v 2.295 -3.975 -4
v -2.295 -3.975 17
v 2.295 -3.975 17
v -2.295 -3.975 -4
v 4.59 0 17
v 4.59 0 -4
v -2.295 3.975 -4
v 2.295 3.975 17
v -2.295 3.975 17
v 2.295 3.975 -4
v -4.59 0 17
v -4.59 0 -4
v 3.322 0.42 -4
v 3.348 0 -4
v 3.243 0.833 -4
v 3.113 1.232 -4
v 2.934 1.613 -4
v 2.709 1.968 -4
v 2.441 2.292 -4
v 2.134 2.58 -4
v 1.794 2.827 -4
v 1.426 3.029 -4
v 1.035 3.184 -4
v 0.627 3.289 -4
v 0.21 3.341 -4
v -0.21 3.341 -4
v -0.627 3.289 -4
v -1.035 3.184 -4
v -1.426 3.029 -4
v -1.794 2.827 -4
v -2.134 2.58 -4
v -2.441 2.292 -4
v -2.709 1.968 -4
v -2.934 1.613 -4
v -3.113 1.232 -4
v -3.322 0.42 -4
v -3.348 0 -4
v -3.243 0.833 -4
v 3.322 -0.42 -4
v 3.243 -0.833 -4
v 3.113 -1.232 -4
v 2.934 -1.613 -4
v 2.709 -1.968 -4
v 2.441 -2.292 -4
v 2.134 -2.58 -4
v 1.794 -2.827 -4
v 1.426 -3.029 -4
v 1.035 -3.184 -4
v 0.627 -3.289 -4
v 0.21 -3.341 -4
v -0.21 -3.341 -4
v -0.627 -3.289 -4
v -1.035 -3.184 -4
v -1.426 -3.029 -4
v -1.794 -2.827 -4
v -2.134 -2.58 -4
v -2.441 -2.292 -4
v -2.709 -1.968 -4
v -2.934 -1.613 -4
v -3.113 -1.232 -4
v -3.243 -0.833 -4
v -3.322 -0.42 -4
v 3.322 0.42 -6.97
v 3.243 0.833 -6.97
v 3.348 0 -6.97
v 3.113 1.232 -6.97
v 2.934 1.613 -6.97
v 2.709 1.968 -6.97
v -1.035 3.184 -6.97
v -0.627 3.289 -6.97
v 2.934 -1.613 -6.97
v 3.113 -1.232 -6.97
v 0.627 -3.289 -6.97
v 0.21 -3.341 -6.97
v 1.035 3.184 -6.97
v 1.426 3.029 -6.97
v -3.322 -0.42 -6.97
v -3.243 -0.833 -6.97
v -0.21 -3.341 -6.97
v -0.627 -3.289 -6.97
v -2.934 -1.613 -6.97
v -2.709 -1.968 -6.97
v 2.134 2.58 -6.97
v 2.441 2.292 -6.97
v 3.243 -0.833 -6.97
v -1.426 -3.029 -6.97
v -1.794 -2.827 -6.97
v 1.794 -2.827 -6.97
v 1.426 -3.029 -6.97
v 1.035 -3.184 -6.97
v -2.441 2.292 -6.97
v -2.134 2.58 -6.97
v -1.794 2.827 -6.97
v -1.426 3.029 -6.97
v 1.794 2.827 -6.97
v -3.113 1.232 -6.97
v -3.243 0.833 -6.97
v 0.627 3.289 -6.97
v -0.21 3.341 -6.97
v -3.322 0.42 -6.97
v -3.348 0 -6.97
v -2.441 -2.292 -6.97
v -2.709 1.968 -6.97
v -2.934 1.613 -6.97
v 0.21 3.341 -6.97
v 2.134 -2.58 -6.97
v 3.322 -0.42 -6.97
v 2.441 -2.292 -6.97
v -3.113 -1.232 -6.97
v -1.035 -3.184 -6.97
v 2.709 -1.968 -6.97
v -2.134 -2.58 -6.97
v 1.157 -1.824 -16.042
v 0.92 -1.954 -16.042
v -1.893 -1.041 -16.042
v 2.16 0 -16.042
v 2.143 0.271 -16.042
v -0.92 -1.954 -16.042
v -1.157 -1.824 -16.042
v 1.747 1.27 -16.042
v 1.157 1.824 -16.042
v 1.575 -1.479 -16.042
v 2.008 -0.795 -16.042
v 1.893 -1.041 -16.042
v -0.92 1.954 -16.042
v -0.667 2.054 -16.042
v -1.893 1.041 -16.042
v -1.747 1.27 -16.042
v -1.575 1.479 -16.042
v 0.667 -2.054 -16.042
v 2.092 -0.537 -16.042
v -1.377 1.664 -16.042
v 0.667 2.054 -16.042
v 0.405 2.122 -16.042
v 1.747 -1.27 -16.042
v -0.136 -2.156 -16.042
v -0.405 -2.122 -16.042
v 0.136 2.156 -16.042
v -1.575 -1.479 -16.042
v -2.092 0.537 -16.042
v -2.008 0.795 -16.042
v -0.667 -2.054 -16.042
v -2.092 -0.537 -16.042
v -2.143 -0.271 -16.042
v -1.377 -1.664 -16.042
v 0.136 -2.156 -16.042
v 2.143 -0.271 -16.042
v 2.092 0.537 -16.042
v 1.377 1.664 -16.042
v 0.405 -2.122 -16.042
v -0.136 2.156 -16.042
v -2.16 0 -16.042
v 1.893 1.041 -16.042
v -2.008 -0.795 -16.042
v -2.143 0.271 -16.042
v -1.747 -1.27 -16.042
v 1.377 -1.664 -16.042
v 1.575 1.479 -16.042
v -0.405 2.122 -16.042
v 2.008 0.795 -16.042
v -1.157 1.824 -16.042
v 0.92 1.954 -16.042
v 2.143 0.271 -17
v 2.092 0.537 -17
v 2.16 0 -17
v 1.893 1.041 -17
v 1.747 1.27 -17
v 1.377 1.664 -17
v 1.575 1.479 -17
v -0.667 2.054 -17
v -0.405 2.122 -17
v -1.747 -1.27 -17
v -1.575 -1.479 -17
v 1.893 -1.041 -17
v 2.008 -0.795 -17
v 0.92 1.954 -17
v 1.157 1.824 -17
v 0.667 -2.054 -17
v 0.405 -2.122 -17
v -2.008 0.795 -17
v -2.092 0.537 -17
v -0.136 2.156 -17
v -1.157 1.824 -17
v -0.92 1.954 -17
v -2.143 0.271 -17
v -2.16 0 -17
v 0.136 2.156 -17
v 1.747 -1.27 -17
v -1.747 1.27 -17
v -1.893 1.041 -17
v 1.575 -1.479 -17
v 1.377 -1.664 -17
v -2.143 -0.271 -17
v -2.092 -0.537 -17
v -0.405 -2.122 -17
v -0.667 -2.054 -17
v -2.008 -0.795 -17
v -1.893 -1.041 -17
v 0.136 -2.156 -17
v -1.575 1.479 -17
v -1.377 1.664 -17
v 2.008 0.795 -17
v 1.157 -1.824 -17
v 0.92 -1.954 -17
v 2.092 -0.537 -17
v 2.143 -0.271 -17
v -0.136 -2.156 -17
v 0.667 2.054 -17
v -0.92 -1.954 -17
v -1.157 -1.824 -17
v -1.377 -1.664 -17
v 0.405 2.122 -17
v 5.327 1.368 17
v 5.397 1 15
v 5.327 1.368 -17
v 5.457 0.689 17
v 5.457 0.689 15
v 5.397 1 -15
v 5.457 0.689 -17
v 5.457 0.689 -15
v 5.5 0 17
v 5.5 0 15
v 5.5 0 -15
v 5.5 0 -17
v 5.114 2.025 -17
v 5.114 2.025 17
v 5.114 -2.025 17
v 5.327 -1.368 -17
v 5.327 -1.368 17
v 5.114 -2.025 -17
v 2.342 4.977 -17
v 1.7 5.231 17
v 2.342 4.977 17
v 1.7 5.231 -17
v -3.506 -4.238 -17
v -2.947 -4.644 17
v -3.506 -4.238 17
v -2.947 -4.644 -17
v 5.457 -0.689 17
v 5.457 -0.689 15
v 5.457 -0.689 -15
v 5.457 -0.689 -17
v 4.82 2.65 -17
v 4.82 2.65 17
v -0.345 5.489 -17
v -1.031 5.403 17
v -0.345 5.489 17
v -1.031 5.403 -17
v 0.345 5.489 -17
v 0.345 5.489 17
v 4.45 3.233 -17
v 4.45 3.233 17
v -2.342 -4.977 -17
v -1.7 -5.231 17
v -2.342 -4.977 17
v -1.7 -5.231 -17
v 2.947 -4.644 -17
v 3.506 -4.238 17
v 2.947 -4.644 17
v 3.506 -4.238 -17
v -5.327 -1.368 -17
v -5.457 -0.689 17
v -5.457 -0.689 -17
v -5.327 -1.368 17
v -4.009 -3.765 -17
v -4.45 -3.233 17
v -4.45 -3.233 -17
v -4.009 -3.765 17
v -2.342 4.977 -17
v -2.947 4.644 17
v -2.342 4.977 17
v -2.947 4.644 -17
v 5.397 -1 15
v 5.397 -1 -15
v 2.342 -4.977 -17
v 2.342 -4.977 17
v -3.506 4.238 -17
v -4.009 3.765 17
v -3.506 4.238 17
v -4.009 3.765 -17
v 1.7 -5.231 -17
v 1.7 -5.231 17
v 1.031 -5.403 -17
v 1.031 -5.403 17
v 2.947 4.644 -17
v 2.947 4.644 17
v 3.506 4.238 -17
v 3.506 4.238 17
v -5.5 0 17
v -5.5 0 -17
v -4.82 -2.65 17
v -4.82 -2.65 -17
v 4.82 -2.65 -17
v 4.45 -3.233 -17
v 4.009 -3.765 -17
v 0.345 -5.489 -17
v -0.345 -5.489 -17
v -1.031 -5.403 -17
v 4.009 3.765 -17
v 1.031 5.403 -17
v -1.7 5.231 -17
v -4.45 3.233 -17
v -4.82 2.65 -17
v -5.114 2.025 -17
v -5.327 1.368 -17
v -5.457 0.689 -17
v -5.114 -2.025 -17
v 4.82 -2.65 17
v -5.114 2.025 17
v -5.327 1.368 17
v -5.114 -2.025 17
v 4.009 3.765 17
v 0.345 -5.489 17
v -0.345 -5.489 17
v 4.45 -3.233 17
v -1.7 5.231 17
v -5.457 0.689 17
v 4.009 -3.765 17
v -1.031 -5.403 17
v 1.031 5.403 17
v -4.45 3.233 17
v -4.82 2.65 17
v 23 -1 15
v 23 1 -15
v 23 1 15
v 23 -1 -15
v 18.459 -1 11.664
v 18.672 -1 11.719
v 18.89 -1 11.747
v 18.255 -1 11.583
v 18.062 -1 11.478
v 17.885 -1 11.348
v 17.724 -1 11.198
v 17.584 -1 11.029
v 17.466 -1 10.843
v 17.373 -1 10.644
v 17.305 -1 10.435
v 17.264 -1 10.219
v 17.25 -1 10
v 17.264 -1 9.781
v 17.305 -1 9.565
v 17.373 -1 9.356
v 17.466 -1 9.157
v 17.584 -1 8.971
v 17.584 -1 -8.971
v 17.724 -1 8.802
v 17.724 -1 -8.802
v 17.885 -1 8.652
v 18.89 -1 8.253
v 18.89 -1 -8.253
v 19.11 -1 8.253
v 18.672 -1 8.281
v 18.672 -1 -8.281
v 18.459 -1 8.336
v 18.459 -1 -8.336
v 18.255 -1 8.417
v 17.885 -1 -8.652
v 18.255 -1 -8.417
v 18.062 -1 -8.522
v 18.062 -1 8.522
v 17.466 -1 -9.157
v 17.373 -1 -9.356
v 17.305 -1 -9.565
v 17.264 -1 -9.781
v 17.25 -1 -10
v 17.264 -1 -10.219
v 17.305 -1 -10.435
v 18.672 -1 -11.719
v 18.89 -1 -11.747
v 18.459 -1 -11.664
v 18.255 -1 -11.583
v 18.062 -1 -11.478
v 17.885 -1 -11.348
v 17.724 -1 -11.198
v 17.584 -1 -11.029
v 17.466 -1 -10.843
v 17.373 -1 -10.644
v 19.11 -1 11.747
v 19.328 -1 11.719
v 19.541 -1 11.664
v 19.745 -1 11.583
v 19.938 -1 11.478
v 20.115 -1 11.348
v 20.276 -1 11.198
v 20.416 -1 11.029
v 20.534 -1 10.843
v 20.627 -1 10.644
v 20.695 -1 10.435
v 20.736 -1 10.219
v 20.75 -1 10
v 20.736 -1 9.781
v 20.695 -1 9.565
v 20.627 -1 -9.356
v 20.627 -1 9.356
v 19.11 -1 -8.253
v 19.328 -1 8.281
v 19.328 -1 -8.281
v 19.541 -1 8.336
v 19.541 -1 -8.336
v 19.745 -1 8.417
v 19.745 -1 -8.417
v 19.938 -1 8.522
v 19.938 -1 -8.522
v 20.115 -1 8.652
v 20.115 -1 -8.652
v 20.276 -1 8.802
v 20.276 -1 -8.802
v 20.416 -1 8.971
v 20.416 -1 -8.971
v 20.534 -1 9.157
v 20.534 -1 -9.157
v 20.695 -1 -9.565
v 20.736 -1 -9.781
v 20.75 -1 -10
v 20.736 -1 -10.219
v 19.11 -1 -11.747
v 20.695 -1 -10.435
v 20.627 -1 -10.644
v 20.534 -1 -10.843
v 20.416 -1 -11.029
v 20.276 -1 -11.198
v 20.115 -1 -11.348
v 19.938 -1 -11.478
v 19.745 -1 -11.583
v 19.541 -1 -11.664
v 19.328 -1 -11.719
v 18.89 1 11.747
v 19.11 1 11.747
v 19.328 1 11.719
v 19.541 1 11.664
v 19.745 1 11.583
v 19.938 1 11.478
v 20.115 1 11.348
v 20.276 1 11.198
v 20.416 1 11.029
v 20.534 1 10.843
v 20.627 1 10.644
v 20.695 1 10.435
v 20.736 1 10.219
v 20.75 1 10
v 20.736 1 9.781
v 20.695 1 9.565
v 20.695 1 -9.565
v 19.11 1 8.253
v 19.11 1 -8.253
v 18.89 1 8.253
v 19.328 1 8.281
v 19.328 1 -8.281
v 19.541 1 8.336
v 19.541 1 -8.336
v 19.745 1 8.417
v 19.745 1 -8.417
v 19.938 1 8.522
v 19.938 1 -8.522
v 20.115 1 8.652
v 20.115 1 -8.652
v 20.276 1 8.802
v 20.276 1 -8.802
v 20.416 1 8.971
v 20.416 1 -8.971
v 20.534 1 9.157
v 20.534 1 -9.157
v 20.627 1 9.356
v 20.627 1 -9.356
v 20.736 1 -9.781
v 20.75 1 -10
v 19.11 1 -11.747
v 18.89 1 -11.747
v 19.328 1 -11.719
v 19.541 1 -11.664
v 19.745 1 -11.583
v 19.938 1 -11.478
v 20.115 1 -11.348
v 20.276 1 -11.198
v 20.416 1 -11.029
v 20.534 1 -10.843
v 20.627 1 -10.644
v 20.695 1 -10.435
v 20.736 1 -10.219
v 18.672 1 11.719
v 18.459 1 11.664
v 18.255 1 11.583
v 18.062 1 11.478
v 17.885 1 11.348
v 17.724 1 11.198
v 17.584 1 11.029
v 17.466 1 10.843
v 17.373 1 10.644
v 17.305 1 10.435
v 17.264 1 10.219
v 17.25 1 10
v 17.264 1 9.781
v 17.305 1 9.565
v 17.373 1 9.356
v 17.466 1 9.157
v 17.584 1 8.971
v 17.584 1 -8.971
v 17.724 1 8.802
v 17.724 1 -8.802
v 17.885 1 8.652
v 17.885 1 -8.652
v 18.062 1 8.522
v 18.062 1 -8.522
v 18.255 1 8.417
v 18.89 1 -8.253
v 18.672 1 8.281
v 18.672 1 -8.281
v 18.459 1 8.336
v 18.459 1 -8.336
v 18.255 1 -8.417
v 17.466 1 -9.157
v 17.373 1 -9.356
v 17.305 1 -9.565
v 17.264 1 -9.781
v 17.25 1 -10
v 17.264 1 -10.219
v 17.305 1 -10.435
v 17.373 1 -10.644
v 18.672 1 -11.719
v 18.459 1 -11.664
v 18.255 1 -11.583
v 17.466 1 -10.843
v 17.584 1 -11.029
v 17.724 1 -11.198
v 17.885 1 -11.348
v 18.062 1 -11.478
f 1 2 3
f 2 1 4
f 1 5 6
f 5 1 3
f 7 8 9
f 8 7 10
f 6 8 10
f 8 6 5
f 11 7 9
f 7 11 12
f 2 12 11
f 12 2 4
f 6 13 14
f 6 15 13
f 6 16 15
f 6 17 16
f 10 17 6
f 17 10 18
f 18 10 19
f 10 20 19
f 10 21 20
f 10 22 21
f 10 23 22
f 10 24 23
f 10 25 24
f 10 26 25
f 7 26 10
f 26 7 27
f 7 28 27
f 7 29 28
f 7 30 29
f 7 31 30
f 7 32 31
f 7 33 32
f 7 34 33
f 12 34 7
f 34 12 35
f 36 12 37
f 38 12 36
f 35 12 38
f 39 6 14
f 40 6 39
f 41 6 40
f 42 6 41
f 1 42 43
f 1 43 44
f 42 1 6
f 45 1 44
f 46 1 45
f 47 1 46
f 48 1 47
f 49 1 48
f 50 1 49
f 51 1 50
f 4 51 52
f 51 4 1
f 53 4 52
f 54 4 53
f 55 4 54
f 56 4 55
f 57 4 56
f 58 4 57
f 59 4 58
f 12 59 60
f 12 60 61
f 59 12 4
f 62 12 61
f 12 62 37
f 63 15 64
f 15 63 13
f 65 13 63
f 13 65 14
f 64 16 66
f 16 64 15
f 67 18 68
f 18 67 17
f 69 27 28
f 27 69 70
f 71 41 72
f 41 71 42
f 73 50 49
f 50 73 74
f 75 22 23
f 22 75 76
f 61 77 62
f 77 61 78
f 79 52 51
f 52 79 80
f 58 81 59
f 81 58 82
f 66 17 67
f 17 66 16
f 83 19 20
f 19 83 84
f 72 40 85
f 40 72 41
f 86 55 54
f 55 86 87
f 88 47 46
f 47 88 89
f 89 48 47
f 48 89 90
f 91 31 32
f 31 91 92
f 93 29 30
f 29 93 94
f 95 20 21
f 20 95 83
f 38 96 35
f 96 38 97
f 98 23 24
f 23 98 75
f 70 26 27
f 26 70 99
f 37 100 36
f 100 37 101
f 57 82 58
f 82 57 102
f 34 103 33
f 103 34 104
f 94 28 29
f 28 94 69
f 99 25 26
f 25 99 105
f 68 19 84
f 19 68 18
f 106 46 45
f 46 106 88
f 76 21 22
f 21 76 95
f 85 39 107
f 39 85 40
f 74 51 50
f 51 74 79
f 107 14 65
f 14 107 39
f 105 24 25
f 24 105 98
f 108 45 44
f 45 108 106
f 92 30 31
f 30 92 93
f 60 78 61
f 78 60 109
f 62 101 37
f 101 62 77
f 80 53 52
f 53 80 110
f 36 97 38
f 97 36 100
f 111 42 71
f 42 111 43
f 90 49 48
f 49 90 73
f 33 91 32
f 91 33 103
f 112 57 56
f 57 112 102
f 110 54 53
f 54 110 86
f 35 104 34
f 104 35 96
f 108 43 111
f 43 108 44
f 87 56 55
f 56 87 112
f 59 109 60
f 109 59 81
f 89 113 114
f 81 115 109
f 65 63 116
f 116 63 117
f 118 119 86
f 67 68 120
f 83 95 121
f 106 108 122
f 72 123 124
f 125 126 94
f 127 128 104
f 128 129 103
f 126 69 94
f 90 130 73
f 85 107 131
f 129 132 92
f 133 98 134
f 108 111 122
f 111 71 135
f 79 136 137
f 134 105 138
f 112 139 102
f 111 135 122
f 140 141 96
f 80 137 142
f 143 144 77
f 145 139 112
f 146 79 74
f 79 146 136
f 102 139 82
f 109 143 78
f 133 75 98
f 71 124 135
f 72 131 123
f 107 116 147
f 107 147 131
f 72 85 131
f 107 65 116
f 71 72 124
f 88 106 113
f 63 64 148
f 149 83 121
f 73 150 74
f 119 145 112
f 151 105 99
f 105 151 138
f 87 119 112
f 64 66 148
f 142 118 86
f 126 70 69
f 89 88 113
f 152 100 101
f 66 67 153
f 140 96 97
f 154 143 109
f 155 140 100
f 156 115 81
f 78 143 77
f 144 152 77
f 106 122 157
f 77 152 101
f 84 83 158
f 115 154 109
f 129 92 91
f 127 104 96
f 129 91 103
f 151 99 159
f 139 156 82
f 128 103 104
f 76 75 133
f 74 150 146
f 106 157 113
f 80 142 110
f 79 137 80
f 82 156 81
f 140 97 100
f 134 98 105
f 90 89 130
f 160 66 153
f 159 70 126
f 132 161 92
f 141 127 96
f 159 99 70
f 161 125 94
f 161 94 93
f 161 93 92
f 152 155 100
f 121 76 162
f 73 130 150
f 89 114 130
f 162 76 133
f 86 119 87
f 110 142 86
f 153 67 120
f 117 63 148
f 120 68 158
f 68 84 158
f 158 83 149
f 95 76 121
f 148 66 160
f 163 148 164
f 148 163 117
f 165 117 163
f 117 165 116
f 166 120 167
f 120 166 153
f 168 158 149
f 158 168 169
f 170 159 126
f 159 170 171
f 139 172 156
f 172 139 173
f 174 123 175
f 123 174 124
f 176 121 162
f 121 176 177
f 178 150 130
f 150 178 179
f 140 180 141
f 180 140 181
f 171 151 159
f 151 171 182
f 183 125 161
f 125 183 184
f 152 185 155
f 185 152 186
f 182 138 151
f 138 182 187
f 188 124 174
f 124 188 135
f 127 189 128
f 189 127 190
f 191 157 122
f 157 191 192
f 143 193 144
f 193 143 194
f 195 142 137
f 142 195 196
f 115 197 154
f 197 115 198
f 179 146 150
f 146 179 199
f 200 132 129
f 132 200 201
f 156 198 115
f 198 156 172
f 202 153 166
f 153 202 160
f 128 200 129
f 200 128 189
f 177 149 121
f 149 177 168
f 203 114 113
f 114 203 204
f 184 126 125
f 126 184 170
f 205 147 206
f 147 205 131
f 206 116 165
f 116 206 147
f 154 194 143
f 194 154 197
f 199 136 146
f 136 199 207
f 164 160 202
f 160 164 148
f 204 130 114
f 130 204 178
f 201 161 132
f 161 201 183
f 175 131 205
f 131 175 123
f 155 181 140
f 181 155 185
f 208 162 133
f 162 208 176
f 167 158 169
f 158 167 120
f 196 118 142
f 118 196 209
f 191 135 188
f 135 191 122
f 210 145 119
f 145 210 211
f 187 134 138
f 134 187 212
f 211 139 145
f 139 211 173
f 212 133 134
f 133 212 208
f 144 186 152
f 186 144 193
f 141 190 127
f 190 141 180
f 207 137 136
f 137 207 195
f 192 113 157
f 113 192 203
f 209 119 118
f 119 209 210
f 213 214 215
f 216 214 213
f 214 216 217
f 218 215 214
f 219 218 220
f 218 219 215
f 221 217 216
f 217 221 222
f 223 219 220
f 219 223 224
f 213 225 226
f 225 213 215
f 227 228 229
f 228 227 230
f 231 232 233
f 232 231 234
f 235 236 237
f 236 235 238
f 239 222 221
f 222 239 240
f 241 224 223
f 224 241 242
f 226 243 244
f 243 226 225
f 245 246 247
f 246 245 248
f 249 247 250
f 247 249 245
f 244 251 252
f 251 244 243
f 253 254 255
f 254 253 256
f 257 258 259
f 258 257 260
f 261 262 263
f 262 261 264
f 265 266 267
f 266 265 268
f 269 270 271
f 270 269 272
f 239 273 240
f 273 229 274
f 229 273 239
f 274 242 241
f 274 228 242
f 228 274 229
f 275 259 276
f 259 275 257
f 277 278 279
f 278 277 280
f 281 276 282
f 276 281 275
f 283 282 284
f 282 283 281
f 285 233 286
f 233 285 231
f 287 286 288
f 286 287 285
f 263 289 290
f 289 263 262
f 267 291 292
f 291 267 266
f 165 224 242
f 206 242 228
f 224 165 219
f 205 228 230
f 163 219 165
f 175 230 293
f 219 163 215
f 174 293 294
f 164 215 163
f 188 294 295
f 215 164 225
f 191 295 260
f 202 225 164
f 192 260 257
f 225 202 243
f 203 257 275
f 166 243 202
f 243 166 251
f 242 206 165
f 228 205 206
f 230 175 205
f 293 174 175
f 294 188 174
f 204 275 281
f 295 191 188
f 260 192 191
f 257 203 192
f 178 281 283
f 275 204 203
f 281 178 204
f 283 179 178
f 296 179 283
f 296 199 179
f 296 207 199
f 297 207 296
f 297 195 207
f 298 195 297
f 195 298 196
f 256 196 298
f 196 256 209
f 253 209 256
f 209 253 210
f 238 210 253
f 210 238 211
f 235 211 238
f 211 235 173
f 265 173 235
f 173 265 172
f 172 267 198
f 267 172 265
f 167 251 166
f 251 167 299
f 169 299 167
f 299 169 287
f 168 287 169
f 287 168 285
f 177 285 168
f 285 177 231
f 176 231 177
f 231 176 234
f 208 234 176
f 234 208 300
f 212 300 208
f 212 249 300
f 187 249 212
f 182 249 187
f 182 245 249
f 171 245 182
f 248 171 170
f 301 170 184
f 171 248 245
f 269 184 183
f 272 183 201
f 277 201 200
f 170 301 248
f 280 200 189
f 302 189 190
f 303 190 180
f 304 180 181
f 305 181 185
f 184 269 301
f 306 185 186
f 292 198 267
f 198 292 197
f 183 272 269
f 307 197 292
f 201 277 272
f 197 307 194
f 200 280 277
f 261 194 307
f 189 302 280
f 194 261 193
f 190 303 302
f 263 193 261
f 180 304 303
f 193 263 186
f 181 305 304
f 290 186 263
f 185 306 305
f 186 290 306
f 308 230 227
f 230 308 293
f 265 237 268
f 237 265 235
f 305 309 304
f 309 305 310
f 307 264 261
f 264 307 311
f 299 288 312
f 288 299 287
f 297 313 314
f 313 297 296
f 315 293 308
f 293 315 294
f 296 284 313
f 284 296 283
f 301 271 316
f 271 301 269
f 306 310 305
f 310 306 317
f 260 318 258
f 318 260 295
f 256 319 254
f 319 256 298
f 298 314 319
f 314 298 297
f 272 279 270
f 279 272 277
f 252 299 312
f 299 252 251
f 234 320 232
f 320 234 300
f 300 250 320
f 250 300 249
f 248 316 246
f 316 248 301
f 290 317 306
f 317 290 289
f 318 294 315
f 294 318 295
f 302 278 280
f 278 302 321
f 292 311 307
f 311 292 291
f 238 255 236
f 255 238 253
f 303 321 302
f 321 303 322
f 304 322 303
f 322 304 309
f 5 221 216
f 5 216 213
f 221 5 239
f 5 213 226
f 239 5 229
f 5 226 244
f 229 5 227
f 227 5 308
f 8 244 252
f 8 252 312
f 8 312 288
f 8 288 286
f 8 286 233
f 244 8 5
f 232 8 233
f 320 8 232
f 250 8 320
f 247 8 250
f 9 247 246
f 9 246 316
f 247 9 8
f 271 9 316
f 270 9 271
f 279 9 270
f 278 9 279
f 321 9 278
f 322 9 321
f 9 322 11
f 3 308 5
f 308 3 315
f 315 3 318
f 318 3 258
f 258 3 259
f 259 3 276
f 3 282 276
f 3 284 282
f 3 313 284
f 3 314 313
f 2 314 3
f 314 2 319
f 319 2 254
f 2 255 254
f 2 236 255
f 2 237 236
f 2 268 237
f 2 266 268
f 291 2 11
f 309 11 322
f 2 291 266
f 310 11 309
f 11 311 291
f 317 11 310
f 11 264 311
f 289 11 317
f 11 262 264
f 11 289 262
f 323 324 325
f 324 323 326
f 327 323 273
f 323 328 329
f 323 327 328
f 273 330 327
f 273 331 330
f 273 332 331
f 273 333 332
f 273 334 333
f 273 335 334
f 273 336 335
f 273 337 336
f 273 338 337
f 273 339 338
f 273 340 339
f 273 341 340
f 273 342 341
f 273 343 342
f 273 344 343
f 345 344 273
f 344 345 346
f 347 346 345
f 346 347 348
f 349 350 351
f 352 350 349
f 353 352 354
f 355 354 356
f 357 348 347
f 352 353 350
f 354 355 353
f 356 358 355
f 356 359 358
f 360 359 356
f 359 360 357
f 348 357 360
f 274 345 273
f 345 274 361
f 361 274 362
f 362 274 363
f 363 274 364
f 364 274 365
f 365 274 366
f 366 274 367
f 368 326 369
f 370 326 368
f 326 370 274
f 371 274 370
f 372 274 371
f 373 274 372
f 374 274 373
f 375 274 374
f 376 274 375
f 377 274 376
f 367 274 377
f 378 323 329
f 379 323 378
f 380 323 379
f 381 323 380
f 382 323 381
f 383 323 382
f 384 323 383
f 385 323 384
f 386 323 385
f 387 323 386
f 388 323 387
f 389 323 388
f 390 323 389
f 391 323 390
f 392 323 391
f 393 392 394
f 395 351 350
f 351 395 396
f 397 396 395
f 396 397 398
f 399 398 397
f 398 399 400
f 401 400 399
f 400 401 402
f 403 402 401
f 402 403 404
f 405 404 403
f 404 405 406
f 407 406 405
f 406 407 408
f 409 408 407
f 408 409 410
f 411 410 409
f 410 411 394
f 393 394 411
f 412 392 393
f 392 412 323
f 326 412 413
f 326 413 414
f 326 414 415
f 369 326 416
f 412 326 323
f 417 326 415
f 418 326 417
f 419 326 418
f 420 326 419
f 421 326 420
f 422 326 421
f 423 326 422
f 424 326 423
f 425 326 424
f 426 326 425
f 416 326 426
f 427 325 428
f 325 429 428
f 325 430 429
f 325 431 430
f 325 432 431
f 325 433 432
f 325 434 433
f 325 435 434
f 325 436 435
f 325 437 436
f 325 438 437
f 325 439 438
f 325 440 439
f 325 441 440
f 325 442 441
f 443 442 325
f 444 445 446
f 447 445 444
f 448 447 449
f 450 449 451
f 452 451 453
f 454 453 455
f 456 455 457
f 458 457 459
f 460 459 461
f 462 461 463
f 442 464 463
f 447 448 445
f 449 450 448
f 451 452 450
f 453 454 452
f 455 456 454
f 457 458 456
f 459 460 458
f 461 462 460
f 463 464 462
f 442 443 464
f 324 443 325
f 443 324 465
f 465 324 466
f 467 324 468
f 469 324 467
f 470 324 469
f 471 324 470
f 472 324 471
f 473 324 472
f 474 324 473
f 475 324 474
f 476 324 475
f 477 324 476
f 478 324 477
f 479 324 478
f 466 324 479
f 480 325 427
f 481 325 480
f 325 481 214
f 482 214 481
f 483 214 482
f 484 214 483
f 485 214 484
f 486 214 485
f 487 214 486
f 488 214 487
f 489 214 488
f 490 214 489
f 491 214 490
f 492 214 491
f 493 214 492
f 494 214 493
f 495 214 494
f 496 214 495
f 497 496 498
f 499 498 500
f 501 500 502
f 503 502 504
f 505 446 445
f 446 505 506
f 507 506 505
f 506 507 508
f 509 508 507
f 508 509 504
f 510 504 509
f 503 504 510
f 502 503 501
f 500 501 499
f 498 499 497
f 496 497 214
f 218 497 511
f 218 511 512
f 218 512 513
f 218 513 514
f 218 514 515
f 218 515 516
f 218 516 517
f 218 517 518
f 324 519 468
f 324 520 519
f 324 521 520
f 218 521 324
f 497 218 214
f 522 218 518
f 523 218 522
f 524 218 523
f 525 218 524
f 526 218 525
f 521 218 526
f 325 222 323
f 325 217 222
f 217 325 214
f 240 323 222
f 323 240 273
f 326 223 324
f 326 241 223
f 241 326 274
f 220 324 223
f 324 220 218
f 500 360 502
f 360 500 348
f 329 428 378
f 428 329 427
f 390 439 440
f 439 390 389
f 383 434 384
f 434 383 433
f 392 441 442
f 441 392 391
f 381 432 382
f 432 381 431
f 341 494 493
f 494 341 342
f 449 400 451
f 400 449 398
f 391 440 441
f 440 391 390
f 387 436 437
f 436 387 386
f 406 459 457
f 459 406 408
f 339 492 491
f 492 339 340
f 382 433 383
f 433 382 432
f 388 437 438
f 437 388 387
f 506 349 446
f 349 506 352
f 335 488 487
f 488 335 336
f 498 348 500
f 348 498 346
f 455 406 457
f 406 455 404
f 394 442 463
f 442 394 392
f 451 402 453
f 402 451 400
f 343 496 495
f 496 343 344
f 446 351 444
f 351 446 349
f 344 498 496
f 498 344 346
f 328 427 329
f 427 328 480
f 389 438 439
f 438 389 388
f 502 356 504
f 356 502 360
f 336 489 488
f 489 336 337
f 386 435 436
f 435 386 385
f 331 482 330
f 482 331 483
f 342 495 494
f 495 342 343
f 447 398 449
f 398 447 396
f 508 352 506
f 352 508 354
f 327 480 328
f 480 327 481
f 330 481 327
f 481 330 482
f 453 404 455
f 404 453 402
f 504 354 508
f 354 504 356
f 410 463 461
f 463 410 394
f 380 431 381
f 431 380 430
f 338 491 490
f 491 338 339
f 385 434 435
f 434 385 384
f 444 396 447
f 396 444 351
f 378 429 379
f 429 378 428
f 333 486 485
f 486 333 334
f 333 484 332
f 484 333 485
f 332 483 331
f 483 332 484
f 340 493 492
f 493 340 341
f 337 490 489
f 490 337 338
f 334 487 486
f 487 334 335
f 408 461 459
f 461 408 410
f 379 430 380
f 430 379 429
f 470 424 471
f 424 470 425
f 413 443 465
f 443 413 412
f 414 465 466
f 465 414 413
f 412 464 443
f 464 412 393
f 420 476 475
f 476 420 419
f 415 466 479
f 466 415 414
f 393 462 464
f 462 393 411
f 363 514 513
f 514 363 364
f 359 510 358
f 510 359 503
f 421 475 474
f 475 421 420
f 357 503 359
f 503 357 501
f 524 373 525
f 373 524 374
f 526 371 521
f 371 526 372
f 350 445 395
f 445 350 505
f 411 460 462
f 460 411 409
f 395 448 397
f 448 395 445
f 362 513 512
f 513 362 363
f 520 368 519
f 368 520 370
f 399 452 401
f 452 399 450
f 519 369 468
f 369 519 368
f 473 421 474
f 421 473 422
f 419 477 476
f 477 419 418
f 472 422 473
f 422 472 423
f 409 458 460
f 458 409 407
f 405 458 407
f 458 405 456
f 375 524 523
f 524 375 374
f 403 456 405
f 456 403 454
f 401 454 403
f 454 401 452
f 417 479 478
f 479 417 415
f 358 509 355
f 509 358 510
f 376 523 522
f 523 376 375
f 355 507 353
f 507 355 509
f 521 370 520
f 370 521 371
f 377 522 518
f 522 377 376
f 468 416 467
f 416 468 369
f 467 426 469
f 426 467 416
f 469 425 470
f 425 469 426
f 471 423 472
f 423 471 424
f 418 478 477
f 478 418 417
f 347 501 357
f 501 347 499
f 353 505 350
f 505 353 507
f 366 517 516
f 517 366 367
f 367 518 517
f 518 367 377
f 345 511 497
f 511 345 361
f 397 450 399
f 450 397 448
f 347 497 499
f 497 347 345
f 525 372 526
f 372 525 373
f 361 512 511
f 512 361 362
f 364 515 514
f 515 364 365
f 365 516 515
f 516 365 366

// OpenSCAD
// print with 0.4 mm nozzle, 0.2 mm layer height
$fn=50;


module pen() {
	da = 8.5;
	db = 6.2;
	dc = 4;

	translate([0, 0, 20/2])
		cylinder(h=20, d=da, center=true, $fn=6);
	translate([0, 0, -2.75/2])
		cylinder(h=2.75, d=db, center=true);
	translate([0, 0, -2.75 - 8.4/2])
		cylinder(h=8.4, d2=db, d1=dc, center=true);
	translate([0, 0, -2.75 - 8.4 - 2])
		cylinder(h=4, d=dc, center=true);
}

module flange() {
	difference() {
		cube(size=[18, 30, 2], center=true);
		translate([5, 10, 0])
			cylinder(h=3, d=3.5, center=true);
		translate([5, -10, 0])
			cylinder(h=3, d=3.5, center=true);
	}
}

difference() {
	cylinder(h=34, d=11, center=true);
	translate([0, 0, -4])
		scale(1.08)
			pen();
}

translate([14, 0, 0])
	rotate([90])
		flange();
